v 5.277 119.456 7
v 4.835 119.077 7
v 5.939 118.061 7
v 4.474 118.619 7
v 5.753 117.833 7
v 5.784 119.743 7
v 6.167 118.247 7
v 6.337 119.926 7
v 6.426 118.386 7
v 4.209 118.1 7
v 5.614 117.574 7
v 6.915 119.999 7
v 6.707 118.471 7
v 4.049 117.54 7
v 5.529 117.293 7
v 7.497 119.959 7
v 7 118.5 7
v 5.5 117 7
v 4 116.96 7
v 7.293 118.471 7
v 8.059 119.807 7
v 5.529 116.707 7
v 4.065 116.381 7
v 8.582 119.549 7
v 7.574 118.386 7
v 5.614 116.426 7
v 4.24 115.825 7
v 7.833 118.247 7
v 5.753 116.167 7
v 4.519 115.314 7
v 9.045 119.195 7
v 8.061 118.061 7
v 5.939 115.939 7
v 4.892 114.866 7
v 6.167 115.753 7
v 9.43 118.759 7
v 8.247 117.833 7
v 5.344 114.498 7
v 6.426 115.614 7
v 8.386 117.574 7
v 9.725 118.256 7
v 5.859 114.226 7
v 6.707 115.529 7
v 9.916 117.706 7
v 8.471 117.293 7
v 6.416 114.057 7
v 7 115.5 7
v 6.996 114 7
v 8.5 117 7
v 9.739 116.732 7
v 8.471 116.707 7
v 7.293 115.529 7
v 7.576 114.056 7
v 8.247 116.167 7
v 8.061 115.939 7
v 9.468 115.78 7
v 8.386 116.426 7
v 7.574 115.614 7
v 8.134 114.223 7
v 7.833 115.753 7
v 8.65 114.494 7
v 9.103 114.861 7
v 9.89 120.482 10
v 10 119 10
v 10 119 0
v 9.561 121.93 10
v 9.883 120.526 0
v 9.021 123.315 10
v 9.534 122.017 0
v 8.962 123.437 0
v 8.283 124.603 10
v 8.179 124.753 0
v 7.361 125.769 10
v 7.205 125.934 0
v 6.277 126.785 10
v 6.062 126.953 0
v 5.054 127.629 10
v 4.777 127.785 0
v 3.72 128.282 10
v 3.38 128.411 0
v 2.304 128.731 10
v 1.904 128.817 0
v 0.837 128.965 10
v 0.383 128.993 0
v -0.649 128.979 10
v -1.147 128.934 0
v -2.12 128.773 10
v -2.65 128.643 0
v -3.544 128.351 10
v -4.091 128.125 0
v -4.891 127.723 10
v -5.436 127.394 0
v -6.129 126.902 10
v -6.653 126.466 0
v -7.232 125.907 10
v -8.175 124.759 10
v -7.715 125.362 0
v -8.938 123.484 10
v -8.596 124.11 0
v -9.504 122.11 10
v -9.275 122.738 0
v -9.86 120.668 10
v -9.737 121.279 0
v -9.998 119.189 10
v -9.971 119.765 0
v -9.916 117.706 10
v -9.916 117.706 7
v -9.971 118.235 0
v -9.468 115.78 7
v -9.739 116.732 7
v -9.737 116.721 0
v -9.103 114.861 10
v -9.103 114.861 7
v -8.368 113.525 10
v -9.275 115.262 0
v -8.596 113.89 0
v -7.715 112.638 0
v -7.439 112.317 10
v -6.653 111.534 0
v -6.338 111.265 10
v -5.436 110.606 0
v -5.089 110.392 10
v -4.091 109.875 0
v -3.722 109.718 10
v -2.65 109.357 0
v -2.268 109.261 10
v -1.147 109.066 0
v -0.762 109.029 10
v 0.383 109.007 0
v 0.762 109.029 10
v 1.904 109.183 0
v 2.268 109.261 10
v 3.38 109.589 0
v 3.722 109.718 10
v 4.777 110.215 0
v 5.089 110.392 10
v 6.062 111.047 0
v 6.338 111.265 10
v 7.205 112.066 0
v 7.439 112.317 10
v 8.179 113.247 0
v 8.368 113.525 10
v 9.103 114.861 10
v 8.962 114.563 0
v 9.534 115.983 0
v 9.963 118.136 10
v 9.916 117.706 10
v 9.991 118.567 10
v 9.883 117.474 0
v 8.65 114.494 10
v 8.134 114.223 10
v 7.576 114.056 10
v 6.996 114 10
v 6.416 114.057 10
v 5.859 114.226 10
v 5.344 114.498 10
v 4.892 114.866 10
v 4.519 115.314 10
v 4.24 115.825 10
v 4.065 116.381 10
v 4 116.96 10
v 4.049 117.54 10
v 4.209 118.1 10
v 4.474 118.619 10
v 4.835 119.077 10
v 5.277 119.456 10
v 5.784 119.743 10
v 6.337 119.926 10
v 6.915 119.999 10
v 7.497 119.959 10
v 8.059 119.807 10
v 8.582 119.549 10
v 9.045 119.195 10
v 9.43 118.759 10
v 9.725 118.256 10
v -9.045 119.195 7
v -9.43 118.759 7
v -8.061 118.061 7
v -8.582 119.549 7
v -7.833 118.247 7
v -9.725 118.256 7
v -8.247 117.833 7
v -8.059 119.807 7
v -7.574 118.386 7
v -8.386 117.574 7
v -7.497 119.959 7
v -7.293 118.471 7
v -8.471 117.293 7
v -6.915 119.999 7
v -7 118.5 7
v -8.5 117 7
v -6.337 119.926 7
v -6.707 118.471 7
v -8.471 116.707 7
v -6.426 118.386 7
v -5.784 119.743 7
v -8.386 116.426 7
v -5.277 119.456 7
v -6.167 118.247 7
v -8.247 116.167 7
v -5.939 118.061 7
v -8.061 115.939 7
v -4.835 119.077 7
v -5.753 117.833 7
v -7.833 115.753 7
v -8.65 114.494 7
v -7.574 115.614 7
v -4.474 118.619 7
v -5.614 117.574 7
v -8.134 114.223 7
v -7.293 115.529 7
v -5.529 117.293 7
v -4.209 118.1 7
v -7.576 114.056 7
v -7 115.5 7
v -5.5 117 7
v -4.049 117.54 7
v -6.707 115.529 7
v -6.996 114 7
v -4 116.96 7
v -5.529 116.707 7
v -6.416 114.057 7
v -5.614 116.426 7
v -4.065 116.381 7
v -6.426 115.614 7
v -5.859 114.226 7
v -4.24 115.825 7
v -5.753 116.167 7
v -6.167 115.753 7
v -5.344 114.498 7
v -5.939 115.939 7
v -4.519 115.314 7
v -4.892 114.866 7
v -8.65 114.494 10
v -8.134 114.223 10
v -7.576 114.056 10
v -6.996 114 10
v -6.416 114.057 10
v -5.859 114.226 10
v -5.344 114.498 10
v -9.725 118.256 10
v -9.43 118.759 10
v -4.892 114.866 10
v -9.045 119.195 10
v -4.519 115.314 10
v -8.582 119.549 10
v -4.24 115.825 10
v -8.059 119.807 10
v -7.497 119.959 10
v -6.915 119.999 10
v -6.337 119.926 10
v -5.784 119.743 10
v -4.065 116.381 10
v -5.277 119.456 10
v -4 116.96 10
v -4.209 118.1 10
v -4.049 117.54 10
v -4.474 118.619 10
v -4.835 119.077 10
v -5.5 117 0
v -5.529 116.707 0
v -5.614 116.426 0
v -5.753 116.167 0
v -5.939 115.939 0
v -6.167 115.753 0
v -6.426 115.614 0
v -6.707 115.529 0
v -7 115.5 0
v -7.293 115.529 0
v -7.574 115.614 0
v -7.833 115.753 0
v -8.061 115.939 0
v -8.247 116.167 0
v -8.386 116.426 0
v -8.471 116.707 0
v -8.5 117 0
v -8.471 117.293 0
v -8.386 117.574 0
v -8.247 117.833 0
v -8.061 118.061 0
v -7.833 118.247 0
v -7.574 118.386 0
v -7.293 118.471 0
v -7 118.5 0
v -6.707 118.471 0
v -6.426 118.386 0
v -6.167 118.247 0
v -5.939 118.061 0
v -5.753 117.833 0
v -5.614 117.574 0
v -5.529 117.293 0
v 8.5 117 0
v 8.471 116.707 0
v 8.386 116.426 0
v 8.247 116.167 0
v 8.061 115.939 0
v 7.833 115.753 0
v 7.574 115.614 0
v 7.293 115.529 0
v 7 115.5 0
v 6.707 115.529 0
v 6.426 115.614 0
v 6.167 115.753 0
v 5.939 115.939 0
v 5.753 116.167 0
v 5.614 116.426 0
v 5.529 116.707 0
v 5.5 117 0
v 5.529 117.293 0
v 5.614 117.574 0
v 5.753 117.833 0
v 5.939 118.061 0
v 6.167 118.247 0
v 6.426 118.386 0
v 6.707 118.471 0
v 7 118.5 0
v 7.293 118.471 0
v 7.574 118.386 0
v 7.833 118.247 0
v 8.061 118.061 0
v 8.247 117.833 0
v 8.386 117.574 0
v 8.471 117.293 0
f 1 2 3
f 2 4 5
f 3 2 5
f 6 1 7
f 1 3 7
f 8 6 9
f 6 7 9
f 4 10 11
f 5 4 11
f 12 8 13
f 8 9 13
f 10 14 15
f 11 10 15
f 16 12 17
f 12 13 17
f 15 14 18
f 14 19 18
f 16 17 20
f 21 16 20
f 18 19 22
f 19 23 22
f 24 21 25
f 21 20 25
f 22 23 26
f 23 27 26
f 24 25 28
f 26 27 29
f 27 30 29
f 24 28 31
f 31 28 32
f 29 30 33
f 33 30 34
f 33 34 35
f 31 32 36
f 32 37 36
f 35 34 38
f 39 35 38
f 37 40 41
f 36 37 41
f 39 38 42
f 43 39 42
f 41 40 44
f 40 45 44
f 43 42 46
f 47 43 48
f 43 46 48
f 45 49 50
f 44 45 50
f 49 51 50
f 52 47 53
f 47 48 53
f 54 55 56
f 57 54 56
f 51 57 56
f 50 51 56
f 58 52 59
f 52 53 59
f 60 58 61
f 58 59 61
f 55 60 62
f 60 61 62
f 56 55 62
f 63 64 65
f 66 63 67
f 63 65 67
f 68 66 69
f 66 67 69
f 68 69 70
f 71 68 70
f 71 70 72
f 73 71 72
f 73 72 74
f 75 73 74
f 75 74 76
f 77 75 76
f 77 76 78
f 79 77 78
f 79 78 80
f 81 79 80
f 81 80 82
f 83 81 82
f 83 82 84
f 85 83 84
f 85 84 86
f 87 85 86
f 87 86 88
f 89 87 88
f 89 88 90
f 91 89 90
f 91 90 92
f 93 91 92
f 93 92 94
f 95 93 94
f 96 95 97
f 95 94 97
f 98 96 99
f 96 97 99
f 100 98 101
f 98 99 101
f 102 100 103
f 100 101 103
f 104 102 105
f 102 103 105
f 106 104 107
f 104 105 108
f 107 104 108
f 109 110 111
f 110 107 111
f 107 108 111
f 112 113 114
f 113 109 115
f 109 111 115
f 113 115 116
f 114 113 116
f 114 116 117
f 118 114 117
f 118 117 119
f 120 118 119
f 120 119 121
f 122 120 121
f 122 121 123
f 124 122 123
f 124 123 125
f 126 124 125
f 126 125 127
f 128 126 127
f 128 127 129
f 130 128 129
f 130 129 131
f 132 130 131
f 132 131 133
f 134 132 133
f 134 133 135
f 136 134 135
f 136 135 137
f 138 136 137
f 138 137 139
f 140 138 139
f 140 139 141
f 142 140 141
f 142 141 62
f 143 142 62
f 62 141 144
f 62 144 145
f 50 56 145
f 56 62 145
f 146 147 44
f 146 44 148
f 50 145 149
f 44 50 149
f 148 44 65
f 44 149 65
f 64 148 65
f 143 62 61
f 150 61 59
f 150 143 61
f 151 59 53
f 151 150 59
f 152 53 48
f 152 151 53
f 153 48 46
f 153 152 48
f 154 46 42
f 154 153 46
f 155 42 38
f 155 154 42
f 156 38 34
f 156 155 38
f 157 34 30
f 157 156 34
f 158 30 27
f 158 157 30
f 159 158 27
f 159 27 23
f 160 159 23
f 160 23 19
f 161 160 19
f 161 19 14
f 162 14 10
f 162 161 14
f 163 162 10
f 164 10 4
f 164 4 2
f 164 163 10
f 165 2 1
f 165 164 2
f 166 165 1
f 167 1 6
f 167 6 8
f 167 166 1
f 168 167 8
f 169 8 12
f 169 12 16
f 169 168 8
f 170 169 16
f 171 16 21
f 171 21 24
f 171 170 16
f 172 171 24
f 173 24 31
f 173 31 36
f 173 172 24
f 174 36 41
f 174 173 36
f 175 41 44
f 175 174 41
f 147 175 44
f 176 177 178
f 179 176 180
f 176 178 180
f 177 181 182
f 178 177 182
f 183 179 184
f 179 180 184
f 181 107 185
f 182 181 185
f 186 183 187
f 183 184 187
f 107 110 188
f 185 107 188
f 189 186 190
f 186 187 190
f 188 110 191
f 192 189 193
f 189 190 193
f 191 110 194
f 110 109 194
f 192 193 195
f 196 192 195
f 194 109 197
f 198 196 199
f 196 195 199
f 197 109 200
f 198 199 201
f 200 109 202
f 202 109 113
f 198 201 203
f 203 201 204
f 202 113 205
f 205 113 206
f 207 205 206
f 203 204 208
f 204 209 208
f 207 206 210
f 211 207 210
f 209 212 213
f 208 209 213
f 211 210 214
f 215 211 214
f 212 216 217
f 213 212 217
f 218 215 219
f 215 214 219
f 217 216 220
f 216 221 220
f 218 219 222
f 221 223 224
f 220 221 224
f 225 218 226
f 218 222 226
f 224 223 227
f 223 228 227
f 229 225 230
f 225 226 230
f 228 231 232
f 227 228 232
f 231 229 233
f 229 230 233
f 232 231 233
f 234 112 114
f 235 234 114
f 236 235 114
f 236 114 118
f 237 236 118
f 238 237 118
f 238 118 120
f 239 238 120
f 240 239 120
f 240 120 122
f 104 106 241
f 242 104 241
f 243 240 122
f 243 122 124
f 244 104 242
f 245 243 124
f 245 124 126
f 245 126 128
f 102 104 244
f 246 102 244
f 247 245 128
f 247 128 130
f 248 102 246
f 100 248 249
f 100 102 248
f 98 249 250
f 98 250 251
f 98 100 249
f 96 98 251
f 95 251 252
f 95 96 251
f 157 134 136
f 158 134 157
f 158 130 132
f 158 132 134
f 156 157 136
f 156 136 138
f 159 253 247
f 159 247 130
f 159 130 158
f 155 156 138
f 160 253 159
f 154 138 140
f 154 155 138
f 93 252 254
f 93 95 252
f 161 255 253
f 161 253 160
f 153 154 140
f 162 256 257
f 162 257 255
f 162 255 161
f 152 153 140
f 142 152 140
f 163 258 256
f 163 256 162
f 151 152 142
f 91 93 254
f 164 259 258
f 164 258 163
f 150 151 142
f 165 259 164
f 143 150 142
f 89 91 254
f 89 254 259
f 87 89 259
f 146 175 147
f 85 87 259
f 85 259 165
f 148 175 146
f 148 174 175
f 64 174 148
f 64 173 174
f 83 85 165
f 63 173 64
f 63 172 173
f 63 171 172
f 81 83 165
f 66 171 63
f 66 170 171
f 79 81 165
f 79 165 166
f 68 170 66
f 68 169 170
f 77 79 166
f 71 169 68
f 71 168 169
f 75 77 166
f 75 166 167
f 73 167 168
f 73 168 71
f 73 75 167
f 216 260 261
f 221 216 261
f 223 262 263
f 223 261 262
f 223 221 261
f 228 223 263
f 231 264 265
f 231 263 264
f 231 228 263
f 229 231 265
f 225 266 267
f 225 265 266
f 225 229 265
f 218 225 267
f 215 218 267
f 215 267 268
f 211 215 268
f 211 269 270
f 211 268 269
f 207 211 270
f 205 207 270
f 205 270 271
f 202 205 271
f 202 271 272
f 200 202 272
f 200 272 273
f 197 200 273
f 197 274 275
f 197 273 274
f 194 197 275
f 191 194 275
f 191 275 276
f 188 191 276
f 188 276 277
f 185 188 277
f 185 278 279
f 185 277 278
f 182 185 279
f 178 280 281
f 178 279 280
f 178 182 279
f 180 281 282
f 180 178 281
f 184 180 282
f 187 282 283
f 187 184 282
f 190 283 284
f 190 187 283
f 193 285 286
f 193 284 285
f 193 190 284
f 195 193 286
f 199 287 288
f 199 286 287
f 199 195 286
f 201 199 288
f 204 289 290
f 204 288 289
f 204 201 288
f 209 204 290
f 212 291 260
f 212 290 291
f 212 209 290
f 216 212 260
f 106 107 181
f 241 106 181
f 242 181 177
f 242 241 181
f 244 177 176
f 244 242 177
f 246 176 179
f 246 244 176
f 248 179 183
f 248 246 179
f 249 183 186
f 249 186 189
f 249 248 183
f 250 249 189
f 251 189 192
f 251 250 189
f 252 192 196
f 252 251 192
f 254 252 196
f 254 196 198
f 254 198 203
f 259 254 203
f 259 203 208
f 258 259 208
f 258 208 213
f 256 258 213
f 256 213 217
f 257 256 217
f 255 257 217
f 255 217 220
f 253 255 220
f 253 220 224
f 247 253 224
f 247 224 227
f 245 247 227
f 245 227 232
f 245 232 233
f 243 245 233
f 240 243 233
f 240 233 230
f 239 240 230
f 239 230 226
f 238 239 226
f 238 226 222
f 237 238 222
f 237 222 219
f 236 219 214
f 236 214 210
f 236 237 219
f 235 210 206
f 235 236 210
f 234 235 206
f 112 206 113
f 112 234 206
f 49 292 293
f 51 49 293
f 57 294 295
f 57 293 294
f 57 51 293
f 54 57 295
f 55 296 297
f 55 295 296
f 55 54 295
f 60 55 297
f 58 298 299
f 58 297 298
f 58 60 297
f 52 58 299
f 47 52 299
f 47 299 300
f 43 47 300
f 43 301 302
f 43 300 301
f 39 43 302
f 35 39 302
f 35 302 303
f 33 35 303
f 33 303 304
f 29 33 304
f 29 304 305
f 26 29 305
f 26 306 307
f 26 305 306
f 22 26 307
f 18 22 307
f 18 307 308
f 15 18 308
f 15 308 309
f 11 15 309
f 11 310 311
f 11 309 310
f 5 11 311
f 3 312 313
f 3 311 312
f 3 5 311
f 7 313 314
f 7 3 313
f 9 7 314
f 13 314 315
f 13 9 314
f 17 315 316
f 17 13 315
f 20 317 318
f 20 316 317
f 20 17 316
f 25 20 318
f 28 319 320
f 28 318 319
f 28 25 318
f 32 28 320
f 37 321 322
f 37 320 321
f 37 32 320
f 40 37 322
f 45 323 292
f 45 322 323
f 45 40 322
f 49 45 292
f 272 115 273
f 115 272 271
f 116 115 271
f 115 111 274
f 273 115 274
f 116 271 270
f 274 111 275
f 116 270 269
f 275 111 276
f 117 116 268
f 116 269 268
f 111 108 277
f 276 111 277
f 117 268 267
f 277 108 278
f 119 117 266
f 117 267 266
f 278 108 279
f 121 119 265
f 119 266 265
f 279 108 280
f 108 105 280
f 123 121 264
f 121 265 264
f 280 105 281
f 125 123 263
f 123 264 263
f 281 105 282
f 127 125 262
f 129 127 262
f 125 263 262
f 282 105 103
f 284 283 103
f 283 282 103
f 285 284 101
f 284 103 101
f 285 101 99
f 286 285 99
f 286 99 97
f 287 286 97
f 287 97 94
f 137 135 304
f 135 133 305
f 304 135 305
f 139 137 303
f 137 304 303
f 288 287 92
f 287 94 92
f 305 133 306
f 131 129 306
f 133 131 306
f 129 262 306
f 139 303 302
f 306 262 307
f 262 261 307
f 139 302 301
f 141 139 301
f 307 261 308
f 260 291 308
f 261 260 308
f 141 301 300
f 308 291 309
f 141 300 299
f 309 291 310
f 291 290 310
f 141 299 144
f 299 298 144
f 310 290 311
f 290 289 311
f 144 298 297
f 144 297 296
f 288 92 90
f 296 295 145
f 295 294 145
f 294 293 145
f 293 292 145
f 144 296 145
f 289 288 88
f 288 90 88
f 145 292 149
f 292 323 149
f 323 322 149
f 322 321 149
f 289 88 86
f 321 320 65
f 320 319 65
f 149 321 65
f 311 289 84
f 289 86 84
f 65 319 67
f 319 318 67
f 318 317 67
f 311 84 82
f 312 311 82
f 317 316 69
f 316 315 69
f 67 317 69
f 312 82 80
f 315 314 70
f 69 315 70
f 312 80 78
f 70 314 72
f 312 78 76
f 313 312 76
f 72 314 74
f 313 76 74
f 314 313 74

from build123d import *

# Parameters (mm, degrees)
CYLINDER568_R               = 3
CYLINDER568_DEPTH           = 4
CYLINDER569_R               = 3
CYLINDER569_DEPTH           = 4
CYLINDER563_R               = 3
CYLINDER563_DEPTH           = 4
CYLINDER570_R               = 3
CYLINDER570_DEPTH           = 4
COMPOUND332_PLACEMENT_ANGLE = 90
CYLINDER566_R               = 1.5
CYLINDER566_DEPTH           = 20
CYLINDER565_R               = 1.5
CYLINDER565_DEPTH           = 20
CYLINDER567_R               = 1.5
CYLINDER567_DEPTH           = 20
CYLINDER564_R               = 1.5
CYLINDER564_DEPTH           = 20
COMPOUND333_PLACEMENT_ANGLE = 90
CYLINDER534_R               = 10
CYLINDER534_DEPTH           = 10


with BuildPart() as v_lec568:
    # Cylinder568 → Cylinder568 (new body)
    with BuildSketch(Plane(origin=(-7, -34, 37), x_dir=(1, 0, 0), z_dir=(0, -1, 0))):
        Circle(CYLINDER568_R)
    extrude(amount=CYLINDER568_DEPTH)


with BuildPart() as v_lec569:
    # Cylinder569 → Cylinder569 (new body)
    with BuildSketch(Plane(origin=(7, -34, 73), x_dir=(1, 0, 0), z_dir=(0, -1, 0))):
        Circle(CYLINDER569_R)
    extrude(amount=CYLINDER569_DEPTH)


with BuildPart() as v_lec563:
    # Cylinder563 → Cylinder563 (new body)
    with BuildSketch(Plane(origin=(-7, -34, 73), x_dir=(1, 0, 0), z_dir=(0, -1, 0))):
        Circle(CYLINDER563_R)
    extrude(amount=CYLINDER563_DEPTH)


with BuildPart() as compound332:
    # Cylinder570 → Cylinder570 (new body)
    with BuildSketch(Plane(origin=(7, -34, 37), x_dir=(1, 0, 0), z_dir=(0, -1, 0))):
        Circle(CYLINDER570_R)
    extrude(amount=CYLINDER570_DEPTH)

    # Compound332: union Válec568, Válec569, Válec563
    add(v_lec568.part)
    add(v_lec569.part)
    add(v_lec563.part)


with BuildPart() as compound332_1:
    # Compound332 placement: moved
    add(compound332.part.moved(Location((0, 141, 45))).rotate(Axis((0, 141, 45), (1, 0, 0)), COMPOUND332_PLACEMENT_ANGLE))


with BuildPart() as v_lec566:
    # Cylinder566 → Cylinder566 (new body)
    with BuildSketch(Plane(origin=(-7, -34, 37), x_dir=(1, 0, 0), z_dir=(0, -1, 0))):
        Circle(CYLINDER566_R)
    extrude(amount=CYLINDER566_DEPTH)


with BuildPart() as v_lec565:
    # Cylinder565 → Cylinder565 (new body)
    with BuildSketch(Plane(origin=(7, -34, 73), x_dir=(1, 0, 0), z_dir=(0, -1, 0))):
        Circle(CYLINDER565_R)
    extrude(amount=CYLINDER565_DEPTH)


with BuildPart() as v_lec567:
    # Cylinder567 → Cylinder567 (new body)
    with BuildSketch(Plane(origin=(-7, -34, 73), x_dir=(1, 0, 0), z_dir=(0, -1, 0))):
        Circle(CYLINDER567_R)
    extrude(amount=CYLINDER567_DEPTH)


with BuildPart() as compound333:
    # Cylinder564 → Cylinder564 (new body)
    with BuildSketch(Plane(origin=(7, -34, 37), x_dir=(1, 0, 0), z_dir=(0, -1, 0))):
        Circle(CYLINDER564_R)
    extrude(amount=CYLINDER564_DEPTH)

    # Compound333: union Válec566, Válec565, Válec567
    add(v_lec566.part)
    add(v_lec565.part)
    add(v_lec567.part)


with BuildPart() as compound333_1:
    # Compound333 placement: moved
    add(compound333.part.moved(Location((0, 141, 45))).rotate(Axis((0, 141, 45), (1, 0, 0)), COMPOUND333_PLACEMENT_ANGLE))


with BuildPart() as cut190:
    # Cylinder534 → Cylinder534 (new body)
    with BuildSketch(Plane(origin=(0, 106, 0), x_dir=(1, 0, 0), z_dir=(0, 0, 1))):
        Circle(CYLINDER534_R)
    extrude(amount=CYLINDER534_DEPTH)

    # Cut189: cut Compound333
    add(compound333_1.part, mode=Mode.SUBTRACT)

    # Cut190: cut Compound332
    add(compound332_1.part, mode=Mode.SUBTRACT)


with BuildPart() as cut190_1:
    # Cut190 placement: moved
    add(cut190.part.moved(Location((0, 13, 0))))


solid = cut190_1.part
